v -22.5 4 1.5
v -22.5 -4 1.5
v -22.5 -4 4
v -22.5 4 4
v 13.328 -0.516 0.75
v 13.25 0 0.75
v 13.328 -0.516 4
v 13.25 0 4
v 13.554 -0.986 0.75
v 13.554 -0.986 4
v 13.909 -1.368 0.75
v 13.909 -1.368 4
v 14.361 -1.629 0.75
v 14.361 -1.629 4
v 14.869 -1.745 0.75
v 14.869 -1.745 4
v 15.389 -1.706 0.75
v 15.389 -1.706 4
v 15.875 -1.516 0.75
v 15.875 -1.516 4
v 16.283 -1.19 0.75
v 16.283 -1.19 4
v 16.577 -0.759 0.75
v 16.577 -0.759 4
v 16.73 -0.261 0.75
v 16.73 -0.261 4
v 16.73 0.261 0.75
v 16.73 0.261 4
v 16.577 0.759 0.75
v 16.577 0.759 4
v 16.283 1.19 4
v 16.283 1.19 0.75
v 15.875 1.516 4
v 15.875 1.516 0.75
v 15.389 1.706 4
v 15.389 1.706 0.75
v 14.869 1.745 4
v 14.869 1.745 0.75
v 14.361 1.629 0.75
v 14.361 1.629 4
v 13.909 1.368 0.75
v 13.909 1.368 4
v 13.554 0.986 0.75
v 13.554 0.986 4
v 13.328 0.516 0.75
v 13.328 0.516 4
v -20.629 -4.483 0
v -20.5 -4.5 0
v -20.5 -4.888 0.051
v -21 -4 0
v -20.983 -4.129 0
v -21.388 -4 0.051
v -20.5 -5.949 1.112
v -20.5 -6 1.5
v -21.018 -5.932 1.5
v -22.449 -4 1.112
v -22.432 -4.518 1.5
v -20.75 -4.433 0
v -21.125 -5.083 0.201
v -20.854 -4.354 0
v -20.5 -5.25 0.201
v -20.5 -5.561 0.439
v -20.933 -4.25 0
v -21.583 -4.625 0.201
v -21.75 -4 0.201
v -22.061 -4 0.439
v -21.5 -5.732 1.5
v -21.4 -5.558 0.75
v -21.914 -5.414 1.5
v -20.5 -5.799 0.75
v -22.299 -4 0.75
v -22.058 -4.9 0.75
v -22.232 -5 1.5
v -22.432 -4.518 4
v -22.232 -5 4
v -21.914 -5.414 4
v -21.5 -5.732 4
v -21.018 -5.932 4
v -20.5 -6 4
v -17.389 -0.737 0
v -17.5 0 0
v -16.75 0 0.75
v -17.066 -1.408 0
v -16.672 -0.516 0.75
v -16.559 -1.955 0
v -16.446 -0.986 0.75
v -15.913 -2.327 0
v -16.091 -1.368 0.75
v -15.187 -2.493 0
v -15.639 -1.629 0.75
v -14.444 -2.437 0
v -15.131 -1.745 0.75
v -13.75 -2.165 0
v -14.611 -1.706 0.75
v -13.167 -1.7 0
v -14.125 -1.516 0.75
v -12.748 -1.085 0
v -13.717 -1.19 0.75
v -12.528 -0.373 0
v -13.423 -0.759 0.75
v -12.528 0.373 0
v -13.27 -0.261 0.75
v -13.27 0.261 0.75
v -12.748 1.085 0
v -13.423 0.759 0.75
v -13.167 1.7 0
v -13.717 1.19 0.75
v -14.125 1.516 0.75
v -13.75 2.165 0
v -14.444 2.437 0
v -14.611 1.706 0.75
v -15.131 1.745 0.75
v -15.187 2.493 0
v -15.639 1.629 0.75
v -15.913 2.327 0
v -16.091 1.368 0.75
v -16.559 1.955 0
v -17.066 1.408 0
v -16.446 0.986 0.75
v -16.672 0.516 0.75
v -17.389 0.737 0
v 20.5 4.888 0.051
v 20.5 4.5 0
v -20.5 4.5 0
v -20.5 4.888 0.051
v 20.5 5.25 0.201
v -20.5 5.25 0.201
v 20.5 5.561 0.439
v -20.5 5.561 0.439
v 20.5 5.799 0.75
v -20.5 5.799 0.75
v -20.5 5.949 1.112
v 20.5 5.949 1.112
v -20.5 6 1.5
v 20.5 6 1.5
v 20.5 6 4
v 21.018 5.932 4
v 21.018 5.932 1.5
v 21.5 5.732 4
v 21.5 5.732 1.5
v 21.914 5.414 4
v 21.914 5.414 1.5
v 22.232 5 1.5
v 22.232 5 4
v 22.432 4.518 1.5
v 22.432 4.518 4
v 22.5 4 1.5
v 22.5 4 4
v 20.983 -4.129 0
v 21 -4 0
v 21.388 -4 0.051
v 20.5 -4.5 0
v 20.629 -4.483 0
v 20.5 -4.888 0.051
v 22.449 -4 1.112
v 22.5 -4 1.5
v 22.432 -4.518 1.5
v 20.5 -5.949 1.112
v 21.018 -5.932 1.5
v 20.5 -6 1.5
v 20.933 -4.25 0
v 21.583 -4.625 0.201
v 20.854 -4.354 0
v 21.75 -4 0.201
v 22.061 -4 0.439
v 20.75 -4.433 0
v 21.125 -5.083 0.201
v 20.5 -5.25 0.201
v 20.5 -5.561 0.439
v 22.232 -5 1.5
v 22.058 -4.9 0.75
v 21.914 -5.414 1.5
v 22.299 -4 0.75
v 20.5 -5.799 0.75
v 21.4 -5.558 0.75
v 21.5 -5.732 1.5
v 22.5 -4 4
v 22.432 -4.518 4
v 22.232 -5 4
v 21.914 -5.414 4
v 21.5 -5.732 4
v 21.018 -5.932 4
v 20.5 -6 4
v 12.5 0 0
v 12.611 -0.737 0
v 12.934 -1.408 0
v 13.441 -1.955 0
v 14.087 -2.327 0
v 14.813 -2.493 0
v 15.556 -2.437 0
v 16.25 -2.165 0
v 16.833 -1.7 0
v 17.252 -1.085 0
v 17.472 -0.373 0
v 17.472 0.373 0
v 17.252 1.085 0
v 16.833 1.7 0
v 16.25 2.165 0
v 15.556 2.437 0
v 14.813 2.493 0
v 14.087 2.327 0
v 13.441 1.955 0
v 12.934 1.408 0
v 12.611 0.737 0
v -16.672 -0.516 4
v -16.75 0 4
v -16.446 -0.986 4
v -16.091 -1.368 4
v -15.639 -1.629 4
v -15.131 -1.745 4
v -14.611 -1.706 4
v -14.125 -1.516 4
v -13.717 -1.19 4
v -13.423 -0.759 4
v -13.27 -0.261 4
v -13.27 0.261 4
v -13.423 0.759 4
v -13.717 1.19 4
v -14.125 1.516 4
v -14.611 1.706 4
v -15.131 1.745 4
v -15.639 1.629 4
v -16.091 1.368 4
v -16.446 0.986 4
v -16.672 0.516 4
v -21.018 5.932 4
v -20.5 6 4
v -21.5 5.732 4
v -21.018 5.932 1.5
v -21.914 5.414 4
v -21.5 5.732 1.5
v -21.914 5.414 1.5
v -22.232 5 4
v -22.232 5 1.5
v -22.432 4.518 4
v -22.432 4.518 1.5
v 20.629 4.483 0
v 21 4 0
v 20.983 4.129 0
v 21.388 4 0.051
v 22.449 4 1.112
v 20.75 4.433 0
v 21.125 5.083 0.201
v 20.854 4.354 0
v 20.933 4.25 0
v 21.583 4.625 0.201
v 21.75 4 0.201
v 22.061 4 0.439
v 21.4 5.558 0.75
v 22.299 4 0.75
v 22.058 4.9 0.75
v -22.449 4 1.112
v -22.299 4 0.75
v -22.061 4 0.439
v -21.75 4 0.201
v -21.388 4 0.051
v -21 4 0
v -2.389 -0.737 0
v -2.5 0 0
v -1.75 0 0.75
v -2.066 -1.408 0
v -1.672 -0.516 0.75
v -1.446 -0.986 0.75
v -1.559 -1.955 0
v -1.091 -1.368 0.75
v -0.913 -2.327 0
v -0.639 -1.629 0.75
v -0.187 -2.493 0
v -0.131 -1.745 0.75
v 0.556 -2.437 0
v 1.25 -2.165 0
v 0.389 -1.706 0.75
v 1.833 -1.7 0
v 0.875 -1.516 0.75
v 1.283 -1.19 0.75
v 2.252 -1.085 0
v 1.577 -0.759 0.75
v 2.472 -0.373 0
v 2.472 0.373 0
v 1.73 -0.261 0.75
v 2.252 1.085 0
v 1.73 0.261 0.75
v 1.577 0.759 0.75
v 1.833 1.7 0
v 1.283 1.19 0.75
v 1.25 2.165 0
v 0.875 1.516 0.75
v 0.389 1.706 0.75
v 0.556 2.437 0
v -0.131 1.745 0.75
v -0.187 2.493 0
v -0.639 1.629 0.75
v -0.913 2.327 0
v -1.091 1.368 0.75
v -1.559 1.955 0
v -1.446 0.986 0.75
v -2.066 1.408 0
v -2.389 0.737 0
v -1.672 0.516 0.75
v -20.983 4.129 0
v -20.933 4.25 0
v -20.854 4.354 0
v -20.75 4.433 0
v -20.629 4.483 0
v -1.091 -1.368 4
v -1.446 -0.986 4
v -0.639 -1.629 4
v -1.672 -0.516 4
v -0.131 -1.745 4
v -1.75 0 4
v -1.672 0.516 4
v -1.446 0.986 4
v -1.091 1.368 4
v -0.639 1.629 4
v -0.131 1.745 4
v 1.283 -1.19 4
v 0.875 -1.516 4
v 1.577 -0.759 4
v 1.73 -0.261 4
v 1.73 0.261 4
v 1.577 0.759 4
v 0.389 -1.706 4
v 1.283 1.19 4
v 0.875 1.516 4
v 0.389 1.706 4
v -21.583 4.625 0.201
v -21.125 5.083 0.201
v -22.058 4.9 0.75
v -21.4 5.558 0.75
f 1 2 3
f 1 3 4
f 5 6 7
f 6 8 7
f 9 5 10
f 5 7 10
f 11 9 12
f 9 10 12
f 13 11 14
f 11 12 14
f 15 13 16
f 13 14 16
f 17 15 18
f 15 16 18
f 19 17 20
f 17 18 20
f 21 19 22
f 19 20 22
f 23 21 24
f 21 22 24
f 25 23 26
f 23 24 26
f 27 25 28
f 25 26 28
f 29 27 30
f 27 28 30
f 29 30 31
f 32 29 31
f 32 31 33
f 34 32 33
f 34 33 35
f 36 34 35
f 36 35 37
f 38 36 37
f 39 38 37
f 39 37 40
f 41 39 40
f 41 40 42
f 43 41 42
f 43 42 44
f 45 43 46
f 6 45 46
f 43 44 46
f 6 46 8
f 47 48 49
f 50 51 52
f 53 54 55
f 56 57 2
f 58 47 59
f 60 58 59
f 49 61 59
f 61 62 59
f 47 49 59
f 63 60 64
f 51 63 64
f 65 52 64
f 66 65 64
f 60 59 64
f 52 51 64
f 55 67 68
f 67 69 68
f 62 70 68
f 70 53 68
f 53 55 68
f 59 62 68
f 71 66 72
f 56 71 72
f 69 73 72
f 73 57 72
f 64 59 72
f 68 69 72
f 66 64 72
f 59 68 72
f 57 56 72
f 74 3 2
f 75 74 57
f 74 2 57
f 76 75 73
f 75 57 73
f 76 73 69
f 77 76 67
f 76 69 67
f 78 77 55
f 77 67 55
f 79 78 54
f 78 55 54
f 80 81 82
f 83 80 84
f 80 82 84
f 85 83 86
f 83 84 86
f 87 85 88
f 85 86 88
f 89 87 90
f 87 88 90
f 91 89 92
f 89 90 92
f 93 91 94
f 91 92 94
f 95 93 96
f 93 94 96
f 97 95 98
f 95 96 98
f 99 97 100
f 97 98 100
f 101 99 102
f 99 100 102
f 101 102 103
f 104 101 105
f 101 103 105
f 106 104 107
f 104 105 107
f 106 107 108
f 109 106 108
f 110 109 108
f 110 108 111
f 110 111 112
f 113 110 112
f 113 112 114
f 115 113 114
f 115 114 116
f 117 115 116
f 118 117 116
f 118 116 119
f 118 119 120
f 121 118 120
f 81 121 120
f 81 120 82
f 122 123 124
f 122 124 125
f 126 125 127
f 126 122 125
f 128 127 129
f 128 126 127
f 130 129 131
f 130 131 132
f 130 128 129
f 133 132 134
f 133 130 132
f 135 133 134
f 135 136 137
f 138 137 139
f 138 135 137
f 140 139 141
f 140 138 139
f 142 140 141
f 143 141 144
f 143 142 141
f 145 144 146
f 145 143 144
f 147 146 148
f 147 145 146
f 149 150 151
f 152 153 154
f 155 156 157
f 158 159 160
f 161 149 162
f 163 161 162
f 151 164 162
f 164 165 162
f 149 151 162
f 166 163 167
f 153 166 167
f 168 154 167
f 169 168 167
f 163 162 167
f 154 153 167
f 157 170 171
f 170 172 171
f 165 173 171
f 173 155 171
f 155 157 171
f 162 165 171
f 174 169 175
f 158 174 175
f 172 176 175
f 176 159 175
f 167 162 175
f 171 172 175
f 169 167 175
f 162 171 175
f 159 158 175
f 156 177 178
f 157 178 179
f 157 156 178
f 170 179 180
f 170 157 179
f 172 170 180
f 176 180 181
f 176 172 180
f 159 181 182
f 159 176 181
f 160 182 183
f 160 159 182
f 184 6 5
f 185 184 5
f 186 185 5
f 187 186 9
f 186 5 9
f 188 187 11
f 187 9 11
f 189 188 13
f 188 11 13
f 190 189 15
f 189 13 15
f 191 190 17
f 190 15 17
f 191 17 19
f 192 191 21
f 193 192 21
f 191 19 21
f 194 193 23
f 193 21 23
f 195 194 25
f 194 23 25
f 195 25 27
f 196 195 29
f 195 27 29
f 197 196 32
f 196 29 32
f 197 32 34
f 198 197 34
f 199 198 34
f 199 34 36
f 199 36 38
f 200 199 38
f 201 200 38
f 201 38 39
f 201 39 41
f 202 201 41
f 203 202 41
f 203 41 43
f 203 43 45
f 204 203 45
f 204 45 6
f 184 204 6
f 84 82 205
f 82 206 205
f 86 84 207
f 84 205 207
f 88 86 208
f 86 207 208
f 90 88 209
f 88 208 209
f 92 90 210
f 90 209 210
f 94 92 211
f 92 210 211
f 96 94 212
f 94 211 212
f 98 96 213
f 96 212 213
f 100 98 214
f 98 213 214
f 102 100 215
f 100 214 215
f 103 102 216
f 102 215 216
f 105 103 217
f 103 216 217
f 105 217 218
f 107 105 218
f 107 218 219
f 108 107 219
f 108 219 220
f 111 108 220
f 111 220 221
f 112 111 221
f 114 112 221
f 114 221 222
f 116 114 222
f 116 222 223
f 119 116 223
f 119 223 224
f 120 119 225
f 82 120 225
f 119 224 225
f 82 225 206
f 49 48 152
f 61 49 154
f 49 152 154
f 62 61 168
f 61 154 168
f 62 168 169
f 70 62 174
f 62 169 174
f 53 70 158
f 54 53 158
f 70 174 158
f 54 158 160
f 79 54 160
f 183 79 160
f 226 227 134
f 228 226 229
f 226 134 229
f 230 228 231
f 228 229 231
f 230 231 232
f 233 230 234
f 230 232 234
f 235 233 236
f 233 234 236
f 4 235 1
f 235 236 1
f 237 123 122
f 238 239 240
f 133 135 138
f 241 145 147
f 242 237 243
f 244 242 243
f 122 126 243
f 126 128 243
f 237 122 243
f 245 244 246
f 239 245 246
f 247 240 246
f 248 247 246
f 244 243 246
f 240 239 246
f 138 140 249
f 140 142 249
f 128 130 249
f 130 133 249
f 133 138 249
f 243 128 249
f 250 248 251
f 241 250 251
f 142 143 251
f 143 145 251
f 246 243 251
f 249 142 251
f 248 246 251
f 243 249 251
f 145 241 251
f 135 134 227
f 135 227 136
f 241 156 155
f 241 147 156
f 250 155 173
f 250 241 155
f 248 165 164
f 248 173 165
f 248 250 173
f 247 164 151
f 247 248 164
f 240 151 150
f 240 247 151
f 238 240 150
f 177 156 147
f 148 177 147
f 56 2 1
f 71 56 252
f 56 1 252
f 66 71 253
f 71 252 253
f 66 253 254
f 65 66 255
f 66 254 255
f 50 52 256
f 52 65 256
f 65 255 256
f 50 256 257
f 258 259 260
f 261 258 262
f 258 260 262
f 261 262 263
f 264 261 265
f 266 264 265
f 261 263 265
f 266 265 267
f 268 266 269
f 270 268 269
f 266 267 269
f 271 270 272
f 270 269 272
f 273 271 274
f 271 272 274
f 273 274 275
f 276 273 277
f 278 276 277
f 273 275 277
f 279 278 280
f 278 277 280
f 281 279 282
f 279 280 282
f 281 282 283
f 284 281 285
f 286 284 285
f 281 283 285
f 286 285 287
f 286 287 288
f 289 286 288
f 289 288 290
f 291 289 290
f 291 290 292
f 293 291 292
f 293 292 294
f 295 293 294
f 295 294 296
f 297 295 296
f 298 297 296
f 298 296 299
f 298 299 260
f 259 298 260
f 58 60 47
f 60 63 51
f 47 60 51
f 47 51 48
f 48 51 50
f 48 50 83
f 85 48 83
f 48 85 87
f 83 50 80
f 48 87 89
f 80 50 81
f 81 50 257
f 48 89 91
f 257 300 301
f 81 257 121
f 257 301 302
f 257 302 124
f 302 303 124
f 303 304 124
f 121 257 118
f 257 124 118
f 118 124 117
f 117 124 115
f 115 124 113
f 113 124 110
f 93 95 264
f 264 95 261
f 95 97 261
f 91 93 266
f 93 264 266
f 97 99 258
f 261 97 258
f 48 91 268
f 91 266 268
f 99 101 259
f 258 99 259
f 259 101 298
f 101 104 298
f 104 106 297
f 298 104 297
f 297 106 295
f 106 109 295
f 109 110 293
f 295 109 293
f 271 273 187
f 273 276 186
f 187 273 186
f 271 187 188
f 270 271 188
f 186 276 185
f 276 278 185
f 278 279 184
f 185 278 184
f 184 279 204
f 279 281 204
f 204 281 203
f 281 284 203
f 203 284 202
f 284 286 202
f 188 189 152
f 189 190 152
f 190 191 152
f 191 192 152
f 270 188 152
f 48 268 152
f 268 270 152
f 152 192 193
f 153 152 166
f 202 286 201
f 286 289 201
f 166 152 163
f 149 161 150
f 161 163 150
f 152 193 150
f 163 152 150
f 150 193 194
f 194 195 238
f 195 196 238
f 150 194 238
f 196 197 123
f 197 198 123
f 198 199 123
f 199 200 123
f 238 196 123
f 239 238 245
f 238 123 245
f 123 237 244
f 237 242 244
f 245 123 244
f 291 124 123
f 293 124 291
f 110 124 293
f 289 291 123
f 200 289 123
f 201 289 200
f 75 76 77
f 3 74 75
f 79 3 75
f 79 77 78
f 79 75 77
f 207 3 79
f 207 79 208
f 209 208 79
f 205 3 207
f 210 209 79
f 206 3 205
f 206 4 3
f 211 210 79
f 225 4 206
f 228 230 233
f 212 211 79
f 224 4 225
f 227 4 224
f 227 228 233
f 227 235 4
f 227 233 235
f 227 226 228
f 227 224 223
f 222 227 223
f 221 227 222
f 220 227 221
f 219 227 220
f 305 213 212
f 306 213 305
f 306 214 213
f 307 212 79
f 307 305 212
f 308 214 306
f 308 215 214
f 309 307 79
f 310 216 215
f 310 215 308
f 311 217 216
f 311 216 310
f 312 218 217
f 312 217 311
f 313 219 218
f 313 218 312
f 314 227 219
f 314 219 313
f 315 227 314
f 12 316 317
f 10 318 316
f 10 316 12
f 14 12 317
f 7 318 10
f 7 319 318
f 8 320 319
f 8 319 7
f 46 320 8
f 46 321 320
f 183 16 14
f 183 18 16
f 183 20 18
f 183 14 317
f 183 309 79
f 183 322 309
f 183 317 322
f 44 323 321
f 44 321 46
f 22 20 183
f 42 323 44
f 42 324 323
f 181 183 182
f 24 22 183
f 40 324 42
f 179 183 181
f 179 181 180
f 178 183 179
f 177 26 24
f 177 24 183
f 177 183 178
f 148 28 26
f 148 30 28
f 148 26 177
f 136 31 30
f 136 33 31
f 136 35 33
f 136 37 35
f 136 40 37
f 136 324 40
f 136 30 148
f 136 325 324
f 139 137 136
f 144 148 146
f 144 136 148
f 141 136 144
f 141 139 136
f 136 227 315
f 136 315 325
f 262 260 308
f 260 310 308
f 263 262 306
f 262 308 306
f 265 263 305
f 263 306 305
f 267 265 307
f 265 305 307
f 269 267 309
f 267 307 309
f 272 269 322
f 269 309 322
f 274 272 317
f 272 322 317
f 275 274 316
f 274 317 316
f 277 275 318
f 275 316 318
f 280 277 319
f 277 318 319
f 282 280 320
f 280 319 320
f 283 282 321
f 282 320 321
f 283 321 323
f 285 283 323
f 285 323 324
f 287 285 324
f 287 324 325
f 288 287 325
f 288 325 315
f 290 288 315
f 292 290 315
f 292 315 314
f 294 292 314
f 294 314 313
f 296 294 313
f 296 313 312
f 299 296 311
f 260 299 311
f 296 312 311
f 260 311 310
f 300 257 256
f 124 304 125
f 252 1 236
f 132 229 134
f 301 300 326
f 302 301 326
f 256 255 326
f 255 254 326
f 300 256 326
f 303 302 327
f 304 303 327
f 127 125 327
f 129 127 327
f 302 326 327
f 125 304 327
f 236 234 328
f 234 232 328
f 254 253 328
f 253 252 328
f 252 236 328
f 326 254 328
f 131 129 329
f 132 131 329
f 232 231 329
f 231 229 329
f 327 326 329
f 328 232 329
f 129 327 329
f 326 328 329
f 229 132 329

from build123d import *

# Parameters (mm, degrees)
F0_W           = 45
F0_H           = 12
F1_DEPTH       = 4
F2_D           = 3.5
F2_CSINK_D     = 5
F2_CSINK_ANGLE = 90
F3_R           = 1.5
F4_T1_DEPTH    = 9
F4_T4_ANGLE    = 90
F4_T6_ANGLE    = 90
F4_T8_ANGLE    = 90
F4_T10_ANGLE   = 90


# Not quite as in the source:
# - a fillet or chamfer that OpenCascade refuses, or shapes differently, is made with other operations: its cross-section is extruded or revolved along the edge and cut away or added


with BuildPart() as f1:
    # F0 (on Top) → F1 (new body)
    with BuildSketch(Plane.XY):
        Rectangle(F0_W, F0_H)
    extrude(amount=F1_DEPTH)

    # F2 (through all)
    with Locations(Plane(origin=(0, 0, 0), x_dir=(1, 0, 0), z_dir=(0, 0, -1))):
        with Locations((-15, 0), (0, 0), (15, 0)):
            CounterSinkHole(F2_D / 2, F2_CSINK_D / 2, counter_sink_angle=F2_CSINK_ANGLE)

    # F3
    f3_edges = [f1.edges().sort_by_distance(p)[0] for p in [
        (0, -6, 0),
        (-22.5, 0, 0),
        (0, 6, 0),
        (22.5, 0, 0),
    ]]
    fillet(f3_edges, radius=F3_R)

    # F4: fillet of radius 2 on 4 edges, made by hand

    # F4_s2 → F4_t1 (cut)
    with BuildSketch(Plane.XY):
        with BuildLine():
            ThreePointArc((22.5, -4), (21.9142135624, -5.4142135624), (20.5, -6))
            Line((20.5, -6), (22.5, -6))
            Line((22.5, -6), (22.5, -4))
        make_face()
        with BuildLine():
            ThreePointArc((20.5, 6), (21.9142135624, 5.4142135624), (22.5, 4))
            Line((22.5, 4), (22.5, 6))
            Line((22.5, 6), (20.5, 6))
        make_face()
        with BuildLine():
            ThreePointArc((-22.5, -4), (-21.9142135624, -5.4142135624), (-20.5, -6))
            Line((-20.5, -6), (-22.5, -6))
            Line((-22.5, -6), (-22.5, -4))
        make_face()
        with BuildLine():
            ThreePointArc((-20.5, 6), (-21.9142135624, 5.4142135624), (-22.5, 4))
            Line((-22.5, 4), (-22.5, 6))
            Line((-22.5, 6), (-20.5, 6))
        make_face()
    extrude(amount=F4_T1_DEPTH, mode=Mode.SUBTRACT)

    # F4_s3 → F4_t4 (revolve, cut)
    with BuildSketch(Plane.XZ.offset(-4)):
        with BuildLine():
            ThreePointArc((-21, 0), (-22.0606601718, 0.4393398282), (-22.5, 1.5))
            Line((-22.5, 1.5), (-22.5, 0))
            Line((-22.5, 0), (-21, 0))
        make_face()
    revolve(axis=Axis((-20.5, 4, 0), (0, 0, -1)), revolution_arc=F4_T4_ANGLE, mode=Mode.SUBTRACT)

    # F4_s5 → F4_t6 (revolve, cut)
    with BuildSketch(Plane.YZ.offset(-20.5)):
        with BuildLine():
            ThreePointArc((-4.5, 0), (-5.5606601718, 0.4393398282), (-6, 1.5))
            Line((-6, 1.5), (-6, 0))
            Line((-6, 0), (-4.5, 0))
        make_face()
    revolve(axis=Axis((-20.5, -4, 0), (0, 0, -1)), revolution_arc=F4_T6_ANGLE, mode=Mode.SUBTRACT)

    # F4_s7 → F4_t8 (revolve, cut)
    with BuildSketch(Plane.YZ.offset(20.5)):
        with BuildLine():
            ThreePointArc((4.5, 0), (5.5606601718, 0.4393398282), (6, 1.5))
            Line((6, 1.5), (6, 0))
            Line((6, 0), (4.5, 0))
        make_face()
    revolve(axis=Axis((20.5, 4, 0), (0, 0, -1)), revolution_arc=F4_T8_ANGLE, mode=Mode.SUBTRACT)

    # F4_s9 → F4_t10 (revolve, cut)
    with BuildSketch(Plane.XZ.offset(4)):
        with BuildLine():
            ThreePointArc((21, 0), (22.0606601718, 0.4393398282), (22.5, 1.5))
            Line((22.5, 1.5), (22.5, 0))
            Line((22.5, 0), (21, 0))
        make_face()
    revolve(axis=Axis((20.5, -4, 0), (0, 0, -1)), revolution_arc=F4_T10_ANGLE, mode=Mode.SUBTRACT)


solid = f1.part
